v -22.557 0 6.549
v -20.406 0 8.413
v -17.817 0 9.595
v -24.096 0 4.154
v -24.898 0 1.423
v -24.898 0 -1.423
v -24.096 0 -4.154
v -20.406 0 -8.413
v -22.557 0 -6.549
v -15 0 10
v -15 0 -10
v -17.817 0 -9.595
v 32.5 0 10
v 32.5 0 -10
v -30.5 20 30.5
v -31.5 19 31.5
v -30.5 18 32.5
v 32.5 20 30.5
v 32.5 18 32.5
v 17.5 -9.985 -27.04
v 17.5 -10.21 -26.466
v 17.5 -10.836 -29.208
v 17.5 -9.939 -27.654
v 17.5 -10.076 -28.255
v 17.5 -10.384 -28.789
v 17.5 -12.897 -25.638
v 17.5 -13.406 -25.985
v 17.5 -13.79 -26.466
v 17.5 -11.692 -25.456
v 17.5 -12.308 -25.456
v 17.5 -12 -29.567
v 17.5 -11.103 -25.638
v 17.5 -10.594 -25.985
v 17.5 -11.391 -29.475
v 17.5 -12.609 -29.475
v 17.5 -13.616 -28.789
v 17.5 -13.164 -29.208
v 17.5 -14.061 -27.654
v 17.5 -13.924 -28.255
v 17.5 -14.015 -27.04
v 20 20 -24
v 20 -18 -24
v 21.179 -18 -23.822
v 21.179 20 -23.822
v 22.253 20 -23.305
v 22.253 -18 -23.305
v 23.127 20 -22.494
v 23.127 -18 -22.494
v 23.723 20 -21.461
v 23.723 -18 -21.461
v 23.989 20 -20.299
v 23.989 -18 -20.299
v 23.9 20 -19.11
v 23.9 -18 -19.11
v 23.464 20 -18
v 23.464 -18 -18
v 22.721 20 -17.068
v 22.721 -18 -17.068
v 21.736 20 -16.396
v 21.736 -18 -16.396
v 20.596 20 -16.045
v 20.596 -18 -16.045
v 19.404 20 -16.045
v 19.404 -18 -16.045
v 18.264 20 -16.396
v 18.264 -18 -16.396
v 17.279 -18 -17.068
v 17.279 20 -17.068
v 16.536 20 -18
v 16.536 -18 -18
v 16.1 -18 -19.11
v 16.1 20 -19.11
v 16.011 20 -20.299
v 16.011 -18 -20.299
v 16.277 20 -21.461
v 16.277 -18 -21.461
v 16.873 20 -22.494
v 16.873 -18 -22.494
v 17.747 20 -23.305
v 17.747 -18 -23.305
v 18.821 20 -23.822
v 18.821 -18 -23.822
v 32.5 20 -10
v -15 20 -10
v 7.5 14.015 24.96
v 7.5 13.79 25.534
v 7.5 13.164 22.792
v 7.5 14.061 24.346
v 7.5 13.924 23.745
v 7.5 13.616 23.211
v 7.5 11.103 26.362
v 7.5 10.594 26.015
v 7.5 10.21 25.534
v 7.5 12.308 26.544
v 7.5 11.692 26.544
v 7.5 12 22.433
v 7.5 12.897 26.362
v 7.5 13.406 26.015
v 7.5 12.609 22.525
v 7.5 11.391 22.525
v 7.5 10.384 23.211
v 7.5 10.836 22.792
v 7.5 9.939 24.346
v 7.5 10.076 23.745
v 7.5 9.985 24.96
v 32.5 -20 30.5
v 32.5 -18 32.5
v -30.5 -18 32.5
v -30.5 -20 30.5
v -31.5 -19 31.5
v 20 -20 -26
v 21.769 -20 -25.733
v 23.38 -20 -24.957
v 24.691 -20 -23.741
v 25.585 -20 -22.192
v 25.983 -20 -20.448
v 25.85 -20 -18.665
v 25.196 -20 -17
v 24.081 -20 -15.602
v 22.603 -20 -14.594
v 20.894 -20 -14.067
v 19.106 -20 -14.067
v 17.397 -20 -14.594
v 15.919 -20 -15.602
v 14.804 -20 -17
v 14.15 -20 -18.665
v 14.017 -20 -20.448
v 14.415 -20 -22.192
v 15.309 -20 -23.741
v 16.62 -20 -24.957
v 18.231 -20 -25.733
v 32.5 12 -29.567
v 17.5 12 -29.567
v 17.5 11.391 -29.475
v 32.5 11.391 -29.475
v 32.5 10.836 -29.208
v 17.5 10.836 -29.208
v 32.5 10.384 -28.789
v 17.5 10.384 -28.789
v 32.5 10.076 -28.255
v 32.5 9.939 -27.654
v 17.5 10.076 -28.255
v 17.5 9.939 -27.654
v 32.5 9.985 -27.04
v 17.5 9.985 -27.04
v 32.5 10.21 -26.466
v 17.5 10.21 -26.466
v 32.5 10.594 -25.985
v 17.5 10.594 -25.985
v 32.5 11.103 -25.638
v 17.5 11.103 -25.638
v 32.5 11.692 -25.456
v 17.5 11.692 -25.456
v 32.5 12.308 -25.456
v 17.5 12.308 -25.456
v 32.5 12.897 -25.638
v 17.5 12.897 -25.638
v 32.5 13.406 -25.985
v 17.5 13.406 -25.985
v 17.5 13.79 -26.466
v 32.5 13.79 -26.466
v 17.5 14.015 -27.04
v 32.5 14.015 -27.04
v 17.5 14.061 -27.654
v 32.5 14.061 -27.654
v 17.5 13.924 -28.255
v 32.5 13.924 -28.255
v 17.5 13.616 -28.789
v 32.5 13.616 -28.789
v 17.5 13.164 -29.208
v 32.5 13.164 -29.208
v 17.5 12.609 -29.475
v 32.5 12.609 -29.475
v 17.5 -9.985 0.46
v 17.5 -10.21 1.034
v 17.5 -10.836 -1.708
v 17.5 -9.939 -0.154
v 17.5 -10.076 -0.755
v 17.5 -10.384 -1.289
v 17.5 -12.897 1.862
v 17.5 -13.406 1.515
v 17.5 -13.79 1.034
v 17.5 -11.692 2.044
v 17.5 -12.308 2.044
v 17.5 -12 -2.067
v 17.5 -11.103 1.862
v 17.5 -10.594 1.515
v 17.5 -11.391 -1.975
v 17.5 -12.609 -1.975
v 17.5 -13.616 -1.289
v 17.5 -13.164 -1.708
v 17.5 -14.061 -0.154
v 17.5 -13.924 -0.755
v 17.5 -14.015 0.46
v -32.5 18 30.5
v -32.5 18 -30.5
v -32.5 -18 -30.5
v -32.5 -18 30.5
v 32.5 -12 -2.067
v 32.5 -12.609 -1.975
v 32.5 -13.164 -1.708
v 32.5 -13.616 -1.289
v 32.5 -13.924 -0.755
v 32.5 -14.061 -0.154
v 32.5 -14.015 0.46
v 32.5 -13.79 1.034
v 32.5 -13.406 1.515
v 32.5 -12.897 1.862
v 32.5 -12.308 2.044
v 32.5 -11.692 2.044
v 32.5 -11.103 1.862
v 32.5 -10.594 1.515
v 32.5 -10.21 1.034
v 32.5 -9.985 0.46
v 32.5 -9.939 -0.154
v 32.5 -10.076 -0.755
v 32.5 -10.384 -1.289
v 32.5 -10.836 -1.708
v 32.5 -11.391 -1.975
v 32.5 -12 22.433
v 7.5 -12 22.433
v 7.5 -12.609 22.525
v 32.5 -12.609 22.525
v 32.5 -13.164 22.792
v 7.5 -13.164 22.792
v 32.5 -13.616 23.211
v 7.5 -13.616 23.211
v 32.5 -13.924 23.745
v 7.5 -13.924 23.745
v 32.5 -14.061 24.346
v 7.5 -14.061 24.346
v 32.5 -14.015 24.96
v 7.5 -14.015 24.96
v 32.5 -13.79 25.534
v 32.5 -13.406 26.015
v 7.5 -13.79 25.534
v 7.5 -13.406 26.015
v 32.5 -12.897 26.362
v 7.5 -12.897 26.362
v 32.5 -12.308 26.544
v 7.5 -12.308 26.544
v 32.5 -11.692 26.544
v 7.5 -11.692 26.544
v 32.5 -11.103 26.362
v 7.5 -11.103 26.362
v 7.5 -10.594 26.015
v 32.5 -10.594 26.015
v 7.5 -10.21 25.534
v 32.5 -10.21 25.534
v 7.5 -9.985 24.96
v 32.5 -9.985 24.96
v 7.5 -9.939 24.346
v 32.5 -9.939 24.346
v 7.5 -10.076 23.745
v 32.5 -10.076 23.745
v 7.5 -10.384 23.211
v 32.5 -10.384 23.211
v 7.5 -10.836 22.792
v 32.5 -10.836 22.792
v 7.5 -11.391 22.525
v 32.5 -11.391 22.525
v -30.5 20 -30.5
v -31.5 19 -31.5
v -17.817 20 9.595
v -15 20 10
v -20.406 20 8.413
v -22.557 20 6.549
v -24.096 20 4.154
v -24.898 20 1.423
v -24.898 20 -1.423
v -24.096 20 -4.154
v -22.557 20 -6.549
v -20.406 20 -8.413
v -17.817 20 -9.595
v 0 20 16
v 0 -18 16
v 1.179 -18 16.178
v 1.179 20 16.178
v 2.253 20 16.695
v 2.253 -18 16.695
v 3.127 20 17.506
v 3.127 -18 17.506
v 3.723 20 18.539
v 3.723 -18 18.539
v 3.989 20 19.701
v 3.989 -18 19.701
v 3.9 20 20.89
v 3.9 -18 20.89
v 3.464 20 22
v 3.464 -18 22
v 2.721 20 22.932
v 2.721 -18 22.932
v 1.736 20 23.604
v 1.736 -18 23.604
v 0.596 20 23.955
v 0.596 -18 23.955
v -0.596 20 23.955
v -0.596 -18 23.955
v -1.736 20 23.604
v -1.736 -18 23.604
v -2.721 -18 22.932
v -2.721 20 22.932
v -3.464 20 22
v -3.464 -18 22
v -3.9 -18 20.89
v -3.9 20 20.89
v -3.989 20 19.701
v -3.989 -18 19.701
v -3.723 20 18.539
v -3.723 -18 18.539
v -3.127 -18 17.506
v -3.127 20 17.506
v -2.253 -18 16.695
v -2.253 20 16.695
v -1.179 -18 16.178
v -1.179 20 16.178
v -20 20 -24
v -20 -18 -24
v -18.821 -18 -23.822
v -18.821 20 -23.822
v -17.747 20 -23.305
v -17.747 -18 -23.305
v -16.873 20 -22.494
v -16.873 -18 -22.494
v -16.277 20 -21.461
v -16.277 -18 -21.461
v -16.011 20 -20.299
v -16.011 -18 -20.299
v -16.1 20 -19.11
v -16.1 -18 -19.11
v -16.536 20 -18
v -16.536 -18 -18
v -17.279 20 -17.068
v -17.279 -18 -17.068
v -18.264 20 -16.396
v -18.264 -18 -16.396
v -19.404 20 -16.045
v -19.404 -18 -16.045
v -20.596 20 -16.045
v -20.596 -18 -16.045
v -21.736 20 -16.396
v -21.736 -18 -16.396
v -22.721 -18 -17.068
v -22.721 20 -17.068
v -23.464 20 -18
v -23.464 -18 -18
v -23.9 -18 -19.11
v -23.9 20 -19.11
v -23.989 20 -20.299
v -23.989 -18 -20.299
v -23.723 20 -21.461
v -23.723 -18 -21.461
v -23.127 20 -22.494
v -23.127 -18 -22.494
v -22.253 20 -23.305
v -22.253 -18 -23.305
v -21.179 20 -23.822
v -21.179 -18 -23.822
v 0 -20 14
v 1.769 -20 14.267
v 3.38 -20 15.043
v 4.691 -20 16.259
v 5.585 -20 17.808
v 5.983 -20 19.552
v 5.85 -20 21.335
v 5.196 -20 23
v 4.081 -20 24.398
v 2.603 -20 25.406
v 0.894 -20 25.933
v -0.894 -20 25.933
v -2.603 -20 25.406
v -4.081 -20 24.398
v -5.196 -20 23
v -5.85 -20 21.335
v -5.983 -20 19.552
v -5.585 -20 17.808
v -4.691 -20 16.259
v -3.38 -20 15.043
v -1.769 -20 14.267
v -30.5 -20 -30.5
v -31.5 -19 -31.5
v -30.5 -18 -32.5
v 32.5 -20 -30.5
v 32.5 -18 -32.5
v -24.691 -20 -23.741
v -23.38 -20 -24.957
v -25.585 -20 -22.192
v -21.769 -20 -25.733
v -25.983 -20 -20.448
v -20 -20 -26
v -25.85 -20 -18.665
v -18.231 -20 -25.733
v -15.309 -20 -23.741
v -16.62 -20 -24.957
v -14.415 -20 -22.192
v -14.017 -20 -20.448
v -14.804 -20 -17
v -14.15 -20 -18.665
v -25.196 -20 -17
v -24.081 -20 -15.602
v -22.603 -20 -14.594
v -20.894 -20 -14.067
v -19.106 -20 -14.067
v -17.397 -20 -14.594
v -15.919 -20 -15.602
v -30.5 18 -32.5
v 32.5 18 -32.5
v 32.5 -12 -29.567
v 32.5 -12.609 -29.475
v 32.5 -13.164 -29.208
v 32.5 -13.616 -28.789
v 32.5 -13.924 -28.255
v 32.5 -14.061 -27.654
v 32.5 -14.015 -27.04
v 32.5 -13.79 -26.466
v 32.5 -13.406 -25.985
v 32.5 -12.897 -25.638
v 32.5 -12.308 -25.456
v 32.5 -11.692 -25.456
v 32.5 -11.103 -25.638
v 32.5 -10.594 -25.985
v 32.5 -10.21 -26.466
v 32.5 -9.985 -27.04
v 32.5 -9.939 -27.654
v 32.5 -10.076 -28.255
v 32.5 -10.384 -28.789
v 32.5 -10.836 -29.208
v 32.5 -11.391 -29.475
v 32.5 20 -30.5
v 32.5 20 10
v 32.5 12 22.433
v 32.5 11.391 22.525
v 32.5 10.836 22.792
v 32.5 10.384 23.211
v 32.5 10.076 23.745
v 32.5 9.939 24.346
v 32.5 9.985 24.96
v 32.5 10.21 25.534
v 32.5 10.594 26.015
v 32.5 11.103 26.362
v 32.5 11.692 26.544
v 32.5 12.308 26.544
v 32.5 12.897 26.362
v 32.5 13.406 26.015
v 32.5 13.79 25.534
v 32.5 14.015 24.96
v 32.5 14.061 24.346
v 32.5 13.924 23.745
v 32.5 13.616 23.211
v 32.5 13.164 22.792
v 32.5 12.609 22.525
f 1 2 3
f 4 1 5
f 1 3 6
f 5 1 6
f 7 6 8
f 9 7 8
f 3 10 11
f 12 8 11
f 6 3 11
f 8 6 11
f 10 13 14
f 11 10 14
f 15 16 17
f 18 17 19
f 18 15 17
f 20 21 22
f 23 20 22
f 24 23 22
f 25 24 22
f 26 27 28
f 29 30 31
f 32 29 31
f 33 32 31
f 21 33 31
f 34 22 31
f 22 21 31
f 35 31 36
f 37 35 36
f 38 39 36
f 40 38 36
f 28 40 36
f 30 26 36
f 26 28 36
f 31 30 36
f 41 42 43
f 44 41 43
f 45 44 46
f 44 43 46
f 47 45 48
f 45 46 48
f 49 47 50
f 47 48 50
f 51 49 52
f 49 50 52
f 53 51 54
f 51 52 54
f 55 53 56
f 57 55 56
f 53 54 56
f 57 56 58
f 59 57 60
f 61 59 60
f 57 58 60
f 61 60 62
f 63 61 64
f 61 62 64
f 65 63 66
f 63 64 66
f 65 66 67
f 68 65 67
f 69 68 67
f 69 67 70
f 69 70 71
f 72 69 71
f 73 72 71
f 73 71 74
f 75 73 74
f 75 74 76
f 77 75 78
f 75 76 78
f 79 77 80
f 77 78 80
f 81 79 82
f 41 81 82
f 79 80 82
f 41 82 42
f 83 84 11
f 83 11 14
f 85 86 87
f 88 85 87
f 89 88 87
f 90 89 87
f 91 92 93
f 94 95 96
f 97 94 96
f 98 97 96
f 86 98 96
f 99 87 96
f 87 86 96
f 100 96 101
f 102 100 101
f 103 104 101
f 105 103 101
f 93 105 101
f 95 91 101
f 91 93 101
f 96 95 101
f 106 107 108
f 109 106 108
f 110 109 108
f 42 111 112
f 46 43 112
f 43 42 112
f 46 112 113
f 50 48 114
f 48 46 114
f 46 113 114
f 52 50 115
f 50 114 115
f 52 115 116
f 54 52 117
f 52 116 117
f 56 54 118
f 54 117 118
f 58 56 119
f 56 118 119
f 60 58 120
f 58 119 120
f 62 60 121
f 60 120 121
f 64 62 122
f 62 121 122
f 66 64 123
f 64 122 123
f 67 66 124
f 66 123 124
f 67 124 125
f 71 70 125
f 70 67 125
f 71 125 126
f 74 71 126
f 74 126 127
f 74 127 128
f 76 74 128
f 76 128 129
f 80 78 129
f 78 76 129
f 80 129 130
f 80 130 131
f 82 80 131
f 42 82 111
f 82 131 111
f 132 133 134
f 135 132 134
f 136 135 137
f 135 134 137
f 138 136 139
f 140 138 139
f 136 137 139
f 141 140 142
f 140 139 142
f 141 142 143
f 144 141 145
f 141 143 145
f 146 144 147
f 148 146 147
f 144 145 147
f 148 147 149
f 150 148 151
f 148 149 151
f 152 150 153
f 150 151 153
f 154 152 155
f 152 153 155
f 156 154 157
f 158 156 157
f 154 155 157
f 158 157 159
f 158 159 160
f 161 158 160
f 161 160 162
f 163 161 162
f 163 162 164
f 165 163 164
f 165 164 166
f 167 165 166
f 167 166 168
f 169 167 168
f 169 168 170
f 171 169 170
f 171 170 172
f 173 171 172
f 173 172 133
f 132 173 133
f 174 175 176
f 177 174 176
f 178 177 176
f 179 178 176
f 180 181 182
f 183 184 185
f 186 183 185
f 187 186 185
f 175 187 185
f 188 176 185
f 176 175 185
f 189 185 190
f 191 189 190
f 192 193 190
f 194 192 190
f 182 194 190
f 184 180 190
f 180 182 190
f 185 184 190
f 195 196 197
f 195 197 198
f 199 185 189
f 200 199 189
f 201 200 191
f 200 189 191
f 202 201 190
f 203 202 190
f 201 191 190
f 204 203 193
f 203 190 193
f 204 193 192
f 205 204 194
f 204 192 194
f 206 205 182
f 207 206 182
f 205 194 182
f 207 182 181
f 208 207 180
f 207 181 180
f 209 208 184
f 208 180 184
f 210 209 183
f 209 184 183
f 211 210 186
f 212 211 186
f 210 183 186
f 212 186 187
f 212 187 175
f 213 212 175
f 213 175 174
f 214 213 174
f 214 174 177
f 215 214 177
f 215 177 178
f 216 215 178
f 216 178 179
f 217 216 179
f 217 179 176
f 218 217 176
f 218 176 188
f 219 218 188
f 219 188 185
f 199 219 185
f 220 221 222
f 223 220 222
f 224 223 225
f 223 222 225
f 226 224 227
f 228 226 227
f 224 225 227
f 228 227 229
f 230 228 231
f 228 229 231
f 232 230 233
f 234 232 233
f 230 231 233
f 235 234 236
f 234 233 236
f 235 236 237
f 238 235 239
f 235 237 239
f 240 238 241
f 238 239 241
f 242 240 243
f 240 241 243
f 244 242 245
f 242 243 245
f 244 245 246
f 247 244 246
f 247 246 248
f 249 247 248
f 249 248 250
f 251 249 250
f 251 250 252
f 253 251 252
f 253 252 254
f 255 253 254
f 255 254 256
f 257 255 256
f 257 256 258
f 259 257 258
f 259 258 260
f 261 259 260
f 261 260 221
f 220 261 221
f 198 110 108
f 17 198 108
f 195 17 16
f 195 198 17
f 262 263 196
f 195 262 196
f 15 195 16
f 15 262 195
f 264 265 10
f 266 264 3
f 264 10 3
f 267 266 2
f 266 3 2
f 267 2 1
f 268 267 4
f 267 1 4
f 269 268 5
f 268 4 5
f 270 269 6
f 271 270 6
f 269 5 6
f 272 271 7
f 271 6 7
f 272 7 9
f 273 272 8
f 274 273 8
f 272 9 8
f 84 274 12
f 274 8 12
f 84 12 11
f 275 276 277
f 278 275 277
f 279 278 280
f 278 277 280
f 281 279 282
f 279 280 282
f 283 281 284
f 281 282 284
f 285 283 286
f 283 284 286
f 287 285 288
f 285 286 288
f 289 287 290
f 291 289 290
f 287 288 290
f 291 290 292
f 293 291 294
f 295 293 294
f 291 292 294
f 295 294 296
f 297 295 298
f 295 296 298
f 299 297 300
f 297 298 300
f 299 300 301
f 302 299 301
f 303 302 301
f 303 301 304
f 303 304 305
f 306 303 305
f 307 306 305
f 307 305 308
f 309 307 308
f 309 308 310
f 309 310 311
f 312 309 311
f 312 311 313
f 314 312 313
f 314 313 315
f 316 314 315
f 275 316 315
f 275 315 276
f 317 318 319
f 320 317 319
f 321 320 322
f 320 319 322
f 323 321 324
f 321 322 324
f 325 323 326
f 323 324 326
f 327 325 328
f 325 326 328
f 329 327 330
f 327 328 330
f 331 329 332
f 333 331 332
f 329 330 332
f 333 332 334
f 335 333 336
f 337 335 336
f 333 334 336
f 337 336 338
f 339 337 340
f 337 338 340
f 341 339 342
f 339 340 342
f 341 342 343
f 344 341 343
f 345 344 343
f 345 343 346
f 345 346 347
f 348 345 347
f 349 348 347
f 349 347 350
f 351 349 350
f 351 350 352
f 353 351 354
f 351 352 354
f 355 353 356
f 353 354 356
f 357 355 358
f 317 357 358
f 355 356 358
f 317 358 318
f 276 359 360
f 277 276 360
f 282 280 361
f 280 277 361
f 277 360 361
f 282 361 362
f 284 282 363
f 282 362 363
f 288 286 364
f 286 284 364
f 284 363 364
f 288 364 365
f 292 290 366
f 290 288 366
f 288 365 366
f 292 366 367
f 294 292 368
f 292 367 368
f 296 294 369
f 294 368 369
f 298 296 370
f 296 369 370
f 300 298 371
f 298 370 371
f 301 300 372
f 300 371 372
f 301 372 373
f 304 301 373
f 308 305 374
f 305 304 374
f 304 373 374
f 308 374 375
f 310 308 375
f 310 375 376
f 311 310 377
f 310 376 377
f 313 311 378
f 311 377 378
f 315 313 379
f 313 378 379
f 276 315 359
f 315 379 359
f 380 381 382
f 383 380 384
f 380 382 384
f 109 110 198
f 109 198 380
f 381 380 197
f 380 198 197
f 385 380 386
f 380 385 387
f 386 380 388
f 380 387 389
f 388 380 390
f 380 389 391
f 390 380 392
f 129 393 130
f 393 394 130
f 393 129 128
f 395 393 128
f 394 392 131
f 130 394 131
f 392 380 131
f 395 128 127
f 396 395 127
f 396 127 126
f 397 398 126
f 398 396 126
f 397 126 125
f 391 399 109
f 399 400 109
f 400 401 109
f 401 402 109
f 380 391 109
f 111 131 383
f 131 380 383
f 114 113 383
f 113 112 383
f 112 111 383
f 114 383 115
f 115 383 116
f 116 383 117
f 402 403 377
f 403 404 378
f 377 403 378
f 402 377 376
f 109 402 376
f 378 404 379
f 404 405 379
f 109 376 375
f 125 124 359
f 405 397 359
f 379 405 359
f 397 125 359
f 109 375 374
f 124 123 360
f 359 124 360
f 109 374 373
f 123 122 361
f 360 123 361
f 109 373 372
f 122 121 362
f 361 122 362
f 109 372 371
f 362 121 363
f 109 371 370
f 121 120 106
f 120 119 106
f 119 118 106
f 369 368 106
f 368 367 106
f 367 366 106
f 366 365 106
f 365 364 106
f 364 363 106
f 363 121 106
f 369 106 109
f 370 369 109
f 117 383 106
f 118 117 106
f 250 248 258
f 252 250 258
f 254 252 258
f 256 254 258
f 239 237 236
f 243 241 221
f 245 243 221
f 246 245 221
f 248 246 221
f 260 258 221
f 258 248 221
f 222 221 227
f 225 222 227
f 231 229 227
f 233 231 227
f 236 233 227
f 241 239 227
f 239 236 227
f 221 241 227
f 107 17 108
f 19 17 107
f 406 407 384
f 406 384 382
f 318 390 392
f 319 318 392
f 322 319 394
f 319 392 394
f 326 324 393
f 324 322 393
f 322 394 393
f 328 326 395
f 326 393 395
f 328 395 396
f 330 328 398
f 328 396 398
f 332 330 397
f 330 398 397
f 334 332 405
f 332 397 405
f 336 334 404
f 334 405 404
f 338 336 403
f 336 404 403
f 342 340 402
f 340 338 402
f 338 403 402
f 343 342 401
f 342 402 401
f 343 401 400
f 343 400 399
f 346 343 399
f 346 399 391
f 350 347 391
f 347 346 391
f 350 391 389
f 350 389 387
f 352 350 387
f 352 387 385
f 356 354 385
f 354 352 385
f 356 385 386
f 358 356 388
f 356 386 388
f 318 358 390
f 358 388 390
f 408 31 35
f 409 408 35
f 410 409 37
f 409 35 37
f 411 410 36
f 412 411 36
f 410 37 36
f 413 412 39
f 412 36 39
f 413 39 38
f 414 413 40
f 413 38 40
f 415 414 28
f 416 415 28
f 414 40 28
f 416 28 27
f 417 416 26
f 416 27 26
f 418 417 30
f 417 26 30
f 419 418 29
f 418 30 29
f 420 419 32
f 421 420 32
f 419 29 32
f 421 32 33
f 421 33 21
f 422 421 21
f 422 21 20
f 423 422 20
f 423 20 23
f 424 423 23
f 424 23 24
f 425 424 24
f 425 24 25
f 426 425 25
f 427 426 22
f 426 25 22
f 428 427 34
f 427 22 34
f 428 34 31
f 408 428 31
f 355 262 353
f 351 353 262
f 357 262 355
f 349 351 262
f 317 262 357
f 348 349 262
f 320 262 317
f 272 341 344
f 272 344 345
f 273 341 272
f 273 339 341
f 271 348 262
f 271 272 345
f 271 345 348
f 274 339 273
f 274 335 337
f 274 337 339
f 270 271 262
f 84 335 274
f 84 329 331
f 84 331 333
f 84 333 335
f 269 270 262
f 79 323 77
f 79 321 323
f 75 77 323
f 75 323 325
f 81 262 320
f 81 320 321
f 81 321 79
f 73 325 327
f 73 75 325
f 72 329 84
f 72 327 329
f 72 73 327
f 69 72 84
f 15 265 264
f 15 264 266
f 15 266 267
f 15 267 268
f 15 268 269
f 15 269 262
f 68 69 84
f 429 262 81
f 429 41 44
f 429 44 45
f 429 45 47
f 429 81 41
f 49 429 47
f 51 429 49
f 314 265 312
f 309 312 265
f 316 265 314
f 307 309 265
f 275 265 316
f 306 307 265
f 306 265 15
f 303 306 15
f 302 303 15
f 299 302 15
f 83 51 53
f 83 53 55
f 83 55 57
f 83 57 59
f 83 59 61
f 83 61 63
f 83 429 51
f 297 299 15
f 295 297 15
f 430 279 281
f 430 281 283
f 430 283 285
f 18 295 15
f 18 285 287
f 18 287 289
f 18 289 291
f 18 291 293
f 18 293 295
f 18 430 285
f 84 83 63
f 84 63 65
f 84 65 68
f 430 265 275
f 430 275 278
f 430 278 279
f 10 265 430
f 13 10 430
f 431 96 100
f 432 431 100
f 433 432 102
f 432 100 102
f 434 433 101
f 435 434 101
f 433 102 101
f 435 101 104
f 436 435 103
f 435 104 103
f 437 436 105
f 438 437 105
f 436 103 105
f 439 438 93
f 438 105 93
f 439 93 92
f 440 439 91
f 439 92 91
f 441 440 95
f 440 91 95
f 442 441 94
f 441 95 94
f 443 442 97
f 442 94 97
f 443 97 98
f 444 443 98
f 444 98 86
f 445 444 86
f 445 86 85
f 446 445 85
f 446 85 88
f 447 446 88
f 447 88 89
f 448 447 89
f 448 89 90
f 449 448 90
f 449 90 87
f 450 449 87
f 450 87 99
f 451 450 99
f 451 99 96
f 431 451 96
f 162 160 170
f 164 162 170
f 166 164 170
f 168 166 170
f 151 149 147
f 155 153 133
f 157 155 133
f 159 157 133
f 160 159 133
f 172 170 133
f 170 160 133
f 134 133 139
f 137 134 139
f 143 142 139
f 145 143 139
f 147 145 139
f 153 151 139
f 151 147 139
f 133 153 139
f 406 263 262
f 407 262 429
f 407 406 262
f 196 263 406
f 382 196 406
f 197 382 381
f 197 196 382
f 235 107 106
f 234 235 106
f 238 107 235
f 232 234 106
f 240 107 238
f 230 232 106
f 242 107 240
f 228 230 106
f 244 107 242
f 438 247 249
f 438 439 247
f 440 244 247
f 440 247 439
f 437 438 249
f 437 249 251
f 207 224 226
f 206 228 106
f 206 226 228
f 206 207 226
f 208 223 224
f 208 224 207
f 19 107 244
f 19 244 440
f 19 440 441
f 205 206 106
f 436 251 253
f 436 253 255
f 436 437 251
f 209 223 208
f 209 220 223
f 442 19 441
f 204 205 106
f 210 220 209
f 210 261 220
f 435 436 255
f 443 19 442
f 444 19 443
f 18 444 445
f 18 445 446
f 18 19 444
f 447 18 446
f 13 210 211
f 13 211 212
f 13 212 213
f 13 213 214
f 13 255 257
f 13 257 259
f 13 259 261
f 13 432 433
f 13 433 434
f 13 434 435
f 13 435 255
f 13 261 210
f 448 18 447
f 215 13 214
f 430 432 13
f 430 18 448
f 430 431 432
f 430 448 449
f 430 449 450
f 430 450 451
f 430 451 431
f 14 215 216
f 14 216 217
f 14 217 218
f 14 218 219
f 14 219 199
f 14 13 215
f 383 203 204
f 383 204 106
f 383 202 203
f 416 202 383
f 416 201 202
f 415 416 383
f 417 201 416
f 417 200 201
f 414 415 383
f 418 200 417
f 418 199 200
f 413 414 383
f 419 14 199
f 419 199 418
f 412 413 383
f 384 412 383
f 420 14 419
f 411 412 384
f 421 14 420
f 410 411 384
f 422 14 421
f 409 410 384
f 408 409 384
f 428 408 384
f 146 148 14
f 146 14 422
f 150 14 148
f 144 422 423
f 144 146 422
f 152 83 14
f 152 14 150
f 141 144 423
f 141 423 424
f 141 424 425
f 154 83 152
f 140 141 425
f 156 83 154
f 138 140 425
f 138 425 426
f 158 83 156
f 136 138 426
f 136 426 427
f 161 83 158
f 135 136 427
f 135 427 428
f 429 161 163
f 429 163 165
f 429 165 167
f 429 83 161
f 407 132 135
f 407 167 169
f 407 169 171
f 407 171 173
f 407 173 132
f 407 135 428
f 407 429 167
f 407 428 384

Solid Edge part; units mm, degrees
sketch "Sketch1" plane through (0, 0, 0) normal (0, -1, 0) x (1, 0, 0)
  line L0 (-32.5, 32.5) -> (32.5, 32.5)
  line L1 (32.5, 32.5) -> (32.5, -32.5)
  line L2 (32.5, -32.5) -> (-32.5, -32.5)
  line L3 (-32.5, -32.5) -> (-32.5, 32.5)
  dimension "D1" = 65
  dimension "D2" = 65
extrude "Protrusion1" add sketch "Sketch1" along normal mid plane 40
hole "Bohrung_1" at (-20, -20, -20) direction (0, 1, 0) diameter 8 end up to next
hole "Hole1" at (20, -20, -20) direction (0, 1, 0) diameter 8 end up to next
hole "Hole2" at (0, -20, 20) direction (0, 1, 0) diameter 8 end up to next
chamfer "Fase_1" distance 2 angle 45 3 edges at (16, -20, -20) (-24, -20, -20) (-4, -20, 20)
chamfer "Fase_2" distance 2 angle 45 3 edges at (0, -20, -32.5) (-32.5, -20, 0) (0, -20, 32.5)
chamfer "Fase_3" distance 2 angle 45 2 edges at (-32.5, 1, -32.5) (-32.5, 1, 32.5)
hole "Bohrung_6" at (-15, 20, 0) direction (0, -1, 0) diameter 20 depth 20
sketch "Sketch2" plane through (0, 20, 0) normal (0, 1, 0) x (1, 0, 0)
  line L0 (-15, 10) -> (32.5, 10)
  line L1 (32.5, 10) -> (32.5, -10)
  line L2 (-15, -10) -> (32.5, -10)
  line L3 (-15, 10) -> (-15, -10)
extrude "Ausschnitt_2" cut sketch "Sketch2" against normal blind 20
hole "Bohrung_7" at (32.5, 12, 24.5) direction (-1, 0, 0) diameter 4.134 depth 25
hole "Hole3" at (32.5, -12, 24.5) direction (-1, 0, 0) diameter 4.134 depth 25
hole "Bohrung_9" at (32.5, -12, 0) direction (-1, 0, 0) diameter 4.134 depth 15
hole "Bohrung_10" at (32.5, 12, -27.5) direction (-1, 0, 0) diameter 4.134 depth 15
hole "Hole4" at (32.5, -12, -27.5) direction (-1, 0, 0) diameter 4.134 depth 15
chamfer "Fase_4" distance 2 angle 45 3 edges at (1, 20, 32.5) (-32.5, 20, 0) (1, 20, -32.5)
properties material "polyamid"
